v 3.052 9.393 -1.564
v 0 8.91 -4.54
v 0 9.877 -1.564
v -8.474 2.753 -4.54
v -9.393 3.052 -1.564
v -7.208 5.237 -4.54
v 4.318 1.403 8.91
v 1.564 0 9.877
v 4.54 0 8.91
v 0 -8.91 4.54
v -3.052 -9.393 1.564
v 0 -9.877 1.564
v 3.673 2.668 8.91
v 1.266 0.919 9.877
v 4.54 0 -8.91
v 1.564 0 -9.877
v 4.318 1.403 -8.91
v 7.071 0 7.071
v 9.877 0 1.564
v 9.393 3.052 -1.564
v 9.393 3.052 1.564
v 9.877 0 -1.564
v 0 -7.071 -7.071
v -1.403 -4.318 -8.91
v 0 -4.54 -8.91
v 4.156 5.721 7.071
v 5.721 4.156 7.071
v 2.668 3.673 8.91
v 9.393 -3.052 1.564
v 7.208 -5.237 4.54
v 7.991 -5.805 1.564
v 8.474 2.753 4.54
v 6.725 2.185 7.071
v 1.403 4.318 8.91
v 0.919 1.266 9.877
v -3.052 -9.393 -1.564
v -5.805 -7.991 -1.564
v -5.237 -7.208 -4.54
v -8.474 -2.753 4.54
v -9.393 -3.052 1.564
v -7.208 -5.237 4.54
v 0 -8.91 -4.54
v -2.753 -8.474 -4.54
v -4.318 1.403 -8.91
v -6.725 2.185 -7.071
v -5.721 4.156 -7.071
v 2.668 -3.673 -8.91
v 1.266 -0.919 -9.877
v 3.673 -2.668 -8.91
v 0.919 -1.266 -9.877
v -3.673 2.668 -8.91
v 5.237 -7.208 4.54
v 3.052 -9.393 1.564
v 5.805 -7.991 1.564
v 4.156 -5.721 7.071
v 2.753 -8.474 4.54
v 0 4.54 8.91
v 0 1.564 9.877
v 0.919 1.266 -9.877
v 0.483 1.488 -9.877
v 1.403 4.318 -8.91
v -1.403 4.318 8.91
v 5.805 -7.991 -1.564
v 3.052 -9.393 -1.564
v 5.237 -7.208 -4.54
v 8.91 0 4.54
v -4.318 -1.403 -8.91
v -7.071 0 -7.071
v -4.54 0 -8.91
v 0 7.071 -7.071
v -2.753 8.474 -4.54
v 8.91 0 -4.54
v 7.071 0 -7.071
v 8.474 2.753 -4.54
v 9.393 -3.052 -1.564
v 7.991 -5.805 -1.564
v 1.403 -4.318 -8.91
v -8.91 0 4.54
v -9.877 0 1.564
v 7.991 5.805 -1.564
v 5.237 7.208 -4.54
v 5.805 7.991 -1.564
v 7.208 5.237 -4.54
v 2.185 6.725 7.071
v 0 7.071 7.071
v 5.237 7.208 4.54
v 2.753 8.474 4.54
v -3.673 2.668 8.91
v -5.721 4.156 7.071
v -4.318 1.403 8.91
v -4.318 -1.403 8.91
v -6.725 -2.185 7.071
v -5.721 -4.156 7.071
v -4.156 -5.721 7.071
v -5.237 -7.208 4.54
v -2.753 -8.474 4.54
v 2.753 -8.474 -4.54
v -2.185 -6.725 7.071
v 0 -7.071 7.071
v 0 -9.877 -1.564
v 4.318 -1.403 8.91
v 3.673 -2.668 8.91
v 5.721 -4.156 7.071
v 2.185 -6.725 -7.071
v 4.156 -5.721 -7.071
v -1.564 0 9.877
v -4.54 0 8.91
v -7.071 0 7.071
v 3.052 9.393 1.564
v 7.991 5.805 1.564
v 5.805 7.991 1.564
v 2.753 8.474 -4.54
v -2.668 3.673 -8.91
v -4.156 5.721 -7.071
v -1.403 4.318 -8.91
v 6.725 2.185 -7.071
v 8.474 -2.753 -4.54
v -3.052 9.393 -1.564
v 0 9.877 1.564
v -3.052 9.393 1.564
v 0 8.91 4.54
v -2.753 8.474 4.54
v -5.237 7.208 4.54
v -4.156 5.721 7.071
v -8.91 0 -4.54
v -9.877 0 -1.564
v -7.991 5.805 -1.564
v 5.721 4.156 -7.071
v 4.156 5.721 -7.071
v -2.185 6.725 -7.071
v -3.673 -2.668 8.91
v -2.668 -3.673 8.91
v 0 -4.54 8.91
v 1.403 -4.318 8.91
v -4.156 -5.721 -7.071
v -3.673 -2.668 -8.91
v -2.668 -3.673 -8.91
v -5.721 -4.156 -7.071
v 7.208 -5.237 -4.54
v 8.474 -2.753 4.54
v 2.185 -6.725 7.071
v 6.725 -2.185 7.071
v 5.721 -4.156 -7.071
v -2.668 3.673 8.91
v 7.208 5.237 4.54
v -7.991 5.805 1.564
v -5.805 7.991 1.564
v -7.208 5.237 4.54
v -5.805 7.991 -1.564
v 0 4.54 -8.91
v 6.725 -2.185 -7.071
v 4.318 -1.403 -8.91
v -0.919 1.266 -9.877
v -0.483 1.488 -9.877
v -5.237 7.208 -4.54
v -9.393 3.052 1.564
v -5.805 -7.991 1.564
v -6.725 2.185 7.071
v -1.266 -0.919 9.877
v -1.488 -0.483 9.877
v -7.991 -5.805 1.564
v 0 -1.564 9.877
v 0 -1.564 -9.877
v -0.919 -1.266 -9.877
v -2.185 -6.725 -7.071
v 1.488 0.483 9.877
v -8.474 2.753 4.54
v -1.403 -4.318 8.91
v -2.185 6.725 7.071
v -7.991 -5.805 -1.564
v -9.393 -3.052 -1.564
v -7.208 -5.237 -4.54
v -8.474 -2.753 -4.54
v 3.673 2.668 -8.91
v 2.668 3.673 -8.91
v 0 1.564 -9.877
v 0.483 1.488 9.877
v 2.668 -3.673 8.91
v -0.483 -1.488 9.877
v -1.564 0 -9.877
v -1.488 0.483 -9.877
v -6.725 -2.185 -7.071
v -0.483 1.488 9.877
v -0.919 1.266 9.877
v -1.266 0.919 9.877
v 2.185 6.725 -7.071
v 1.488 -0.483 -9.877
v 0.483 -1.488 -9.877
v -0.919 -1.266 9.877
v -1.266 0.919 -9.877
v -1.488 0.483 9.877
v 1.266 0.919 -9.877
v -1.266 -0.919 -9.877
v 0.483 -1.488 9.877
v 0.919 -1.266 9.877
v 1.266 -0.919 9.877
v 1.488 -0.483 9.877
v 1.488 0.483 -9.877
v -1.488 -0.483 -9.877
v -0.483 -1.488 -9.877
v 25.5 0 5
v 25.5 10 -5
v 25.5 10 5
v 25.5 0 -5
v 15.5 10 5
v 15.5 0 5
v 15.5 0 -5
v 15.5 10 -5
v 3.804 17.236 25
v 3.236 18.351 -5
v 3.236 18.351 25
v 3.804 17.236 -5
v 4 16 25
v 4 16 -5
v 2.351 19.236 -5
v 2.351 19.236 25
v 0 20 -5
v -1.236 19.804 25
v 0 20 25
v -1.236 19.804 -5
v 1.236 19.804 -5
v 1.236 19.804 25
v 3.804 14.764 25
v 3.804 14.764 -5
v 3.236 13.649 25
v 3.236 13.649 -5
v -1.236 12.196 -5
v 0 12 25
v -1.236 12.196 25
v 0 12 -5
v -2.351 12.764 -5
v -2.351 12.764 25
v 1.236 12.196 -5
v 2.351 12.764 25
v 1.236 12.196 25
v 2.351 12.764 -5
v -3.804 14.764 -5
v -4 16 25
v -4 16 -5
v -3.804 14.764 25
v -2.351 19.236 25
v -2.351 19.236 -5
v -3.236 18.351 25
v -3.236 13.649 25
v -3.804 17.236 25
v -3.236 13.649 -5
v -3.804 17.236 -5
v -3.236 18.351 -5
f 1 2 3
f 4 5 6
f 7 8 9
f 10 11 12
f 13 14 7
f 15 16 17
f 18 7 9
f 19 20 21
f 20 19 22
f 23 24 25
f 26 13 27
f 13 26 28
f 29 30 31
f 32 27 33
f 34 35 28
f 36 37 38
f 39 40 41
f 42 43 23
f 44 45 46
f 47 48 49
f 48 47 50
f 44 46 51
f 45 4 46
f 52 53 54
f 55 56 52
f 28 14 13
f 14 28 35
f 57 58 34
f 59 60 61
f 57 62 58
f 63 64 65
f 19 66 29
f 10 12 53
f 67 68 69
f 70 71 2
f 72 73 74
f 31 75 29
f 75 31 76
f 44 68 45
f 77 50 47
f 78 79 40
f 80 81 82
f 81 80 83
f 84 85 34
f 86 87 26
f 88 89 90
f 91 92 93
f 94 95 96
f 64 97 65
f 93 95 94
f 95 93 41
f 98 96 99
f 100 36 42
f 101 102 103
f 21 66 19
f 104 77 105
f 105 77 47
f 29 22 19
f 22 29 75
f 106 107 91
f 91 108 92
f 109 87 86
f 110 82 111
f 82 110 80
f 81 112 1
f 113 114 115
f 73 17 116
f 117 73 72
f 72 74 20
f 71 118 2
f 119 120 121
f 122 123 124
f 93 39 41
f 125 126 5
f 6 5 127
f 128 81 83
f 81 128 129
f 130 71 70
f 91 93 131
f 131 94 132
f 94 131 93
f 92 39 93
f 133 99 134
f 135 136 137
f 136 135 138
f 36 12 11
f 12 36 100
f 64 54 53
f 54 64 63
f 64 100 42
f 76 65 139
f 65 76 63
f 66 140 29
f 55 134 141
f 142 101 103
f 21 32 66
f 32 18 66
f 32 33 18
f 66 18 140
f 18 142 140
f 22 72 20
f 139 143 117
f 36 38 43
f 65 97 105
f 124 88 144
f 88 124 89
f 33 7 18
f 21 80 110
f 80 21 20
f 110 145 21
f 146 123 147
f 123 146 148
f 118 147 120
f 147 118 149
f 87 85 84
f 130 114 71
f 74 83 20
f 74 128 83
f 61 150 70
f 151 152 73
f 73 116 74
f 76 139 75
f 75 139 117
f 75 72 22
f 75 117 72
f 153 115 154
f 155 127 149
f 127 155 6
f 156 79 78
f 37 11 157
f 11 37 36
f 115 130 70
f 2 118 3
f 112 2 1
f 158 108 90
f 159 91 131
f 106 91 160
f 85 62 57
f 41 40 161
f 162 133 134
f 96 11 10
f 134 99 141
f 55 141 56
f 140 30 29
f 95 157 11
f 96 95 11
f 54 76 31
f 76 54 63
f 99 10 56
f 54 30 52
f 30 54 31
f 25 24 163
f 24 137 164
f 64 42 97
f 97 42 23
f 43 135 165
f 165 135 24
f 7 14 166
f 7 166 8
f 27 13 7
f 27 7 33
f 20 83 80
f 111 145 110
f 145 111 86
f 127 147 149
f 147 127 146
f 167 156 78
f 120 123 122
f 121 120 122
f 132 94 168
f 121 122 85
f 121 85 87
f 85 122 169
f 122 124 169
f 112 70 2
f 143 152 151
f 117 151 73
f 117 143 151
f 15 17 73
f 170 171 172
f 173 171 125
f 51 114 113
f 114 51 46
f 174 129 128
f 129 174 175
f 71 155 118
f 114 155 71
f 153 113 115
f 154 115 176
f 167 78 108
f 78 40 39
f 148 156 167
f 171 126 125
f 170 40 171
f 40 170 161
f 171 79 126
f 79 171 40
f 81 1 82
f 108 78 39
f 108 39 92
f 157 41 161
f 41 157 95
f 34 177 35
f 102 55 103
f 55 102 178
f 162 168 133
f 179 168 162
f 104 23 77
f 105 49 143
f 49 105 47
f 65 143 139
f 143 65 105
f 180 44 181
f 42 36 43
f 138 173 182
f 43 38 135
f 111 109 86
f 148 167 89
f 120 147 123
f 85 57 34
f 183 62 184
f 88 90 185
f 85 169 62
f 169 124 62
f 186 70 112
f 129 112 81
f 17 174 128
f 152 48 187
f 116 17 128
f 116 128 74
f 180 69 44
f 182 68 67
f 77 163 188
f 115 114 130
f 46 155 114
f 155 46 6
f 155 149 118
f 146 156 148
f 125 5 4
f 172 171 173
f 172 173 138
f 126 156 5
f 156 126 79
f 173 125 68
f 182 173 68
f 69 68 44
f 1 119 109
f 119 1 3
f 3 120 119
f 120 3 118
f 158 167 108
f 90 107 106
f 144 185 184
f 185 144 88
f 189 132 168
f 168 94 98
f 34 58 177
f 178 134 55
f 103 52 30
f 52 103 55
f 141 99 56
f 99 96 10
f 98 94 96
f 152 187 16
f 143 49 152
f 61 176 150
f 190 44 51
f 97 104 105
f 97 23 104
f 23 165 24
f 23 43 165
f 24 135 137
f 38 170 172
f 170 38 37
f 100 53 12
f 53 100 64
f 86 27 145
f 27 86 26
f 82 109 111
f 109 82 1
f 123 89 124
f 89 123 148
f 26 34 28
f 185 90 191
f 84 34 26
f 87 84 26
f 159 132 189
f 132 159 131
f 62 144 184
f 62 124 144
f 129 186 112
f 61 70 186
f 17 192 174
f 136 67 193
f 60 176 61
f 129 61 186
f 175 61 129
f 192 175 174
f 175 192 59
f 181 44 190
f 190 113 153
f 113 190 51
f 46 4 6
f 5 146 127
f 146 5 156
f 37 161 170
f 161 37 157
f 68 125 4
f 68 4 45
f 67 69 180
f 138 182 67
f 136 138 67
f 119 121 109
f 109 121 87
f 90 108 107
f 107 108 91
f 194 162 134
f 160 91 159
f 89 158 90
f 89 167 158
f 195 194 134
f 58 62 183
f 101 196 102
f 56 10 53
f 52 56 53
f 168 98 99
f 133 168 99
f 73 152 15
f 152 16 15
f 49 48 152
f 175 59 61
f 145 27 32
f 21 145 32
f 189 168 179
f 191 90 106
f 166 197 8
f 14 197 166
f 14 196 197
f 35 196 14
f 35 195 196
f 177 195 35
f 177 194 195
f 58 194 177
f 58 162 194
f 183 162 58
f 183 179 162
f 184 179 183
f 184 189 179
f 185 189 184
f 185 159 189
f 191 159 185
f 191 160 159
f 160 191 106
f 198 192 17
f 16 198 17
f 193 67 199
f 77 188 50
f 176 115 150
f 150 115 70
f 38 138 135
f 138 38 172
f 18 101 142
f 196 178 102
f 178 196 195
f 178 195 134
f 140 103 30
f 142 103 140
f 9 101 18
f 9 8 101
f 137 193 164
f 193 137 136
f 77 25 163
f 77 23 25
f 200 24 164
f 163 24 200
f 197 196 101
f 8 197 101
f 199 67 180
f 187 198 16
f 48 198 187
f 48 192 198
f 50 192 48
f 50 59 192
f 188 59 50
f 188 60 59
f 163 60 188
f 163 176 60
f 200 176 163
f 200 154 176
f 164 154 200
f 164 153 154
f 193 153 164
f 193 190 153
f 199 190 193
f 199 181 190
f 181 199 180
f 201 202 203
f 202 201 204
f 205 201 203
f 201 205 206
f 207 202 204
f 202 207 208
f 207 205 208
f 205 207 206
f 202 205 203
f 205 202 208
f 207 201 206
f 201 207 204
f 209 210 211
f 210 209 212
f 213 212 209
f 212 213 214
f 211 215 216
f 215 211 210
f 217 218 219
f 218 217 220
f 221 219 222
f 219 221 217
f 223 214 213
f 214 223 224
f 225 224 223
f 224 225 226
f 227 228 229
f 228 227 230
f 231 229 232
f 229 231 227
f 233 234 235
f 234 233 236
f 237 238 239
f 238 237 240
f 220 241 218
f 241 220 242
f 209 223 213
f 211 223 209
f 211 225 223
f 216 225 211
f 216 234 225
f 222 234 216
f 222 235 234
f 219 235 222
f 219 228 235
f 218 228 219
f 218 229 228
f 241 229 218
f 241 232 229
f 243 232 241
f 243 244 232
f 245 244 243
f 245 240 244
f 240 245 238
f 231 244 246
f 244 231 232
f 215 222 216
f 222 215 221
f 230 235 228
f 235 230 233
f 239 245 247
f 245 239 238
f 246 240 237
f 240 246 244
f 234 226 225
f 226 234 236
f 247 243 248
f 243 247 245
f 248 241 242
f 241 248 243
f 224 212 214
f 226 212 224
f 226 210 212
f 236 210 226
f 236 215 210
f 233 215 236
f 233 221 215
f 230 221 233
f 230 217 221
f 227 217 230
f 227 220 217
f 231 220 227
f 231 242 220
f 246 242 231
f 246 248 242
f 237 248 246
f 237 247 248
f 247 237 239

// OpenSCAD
//Instructions: 
//1. a. Rotate (one finger) 
//   b. Zoom (two fingers) 
//   c. Preview (>>) 
//   d. Render (cube button) 
//   e. Save (File menu)
//   f. Export as STL (File menu)
//2. Change $fn to different numbers and preview. This controls the resolution of your shapes - very important for a high quality print. 
//3. Modify this code to make a sphere of radius 5.
//4. Move the cube close to the sphere so that they overlap.
//5. Make the cube have a height of 2.
//6. Change one radius of the cylinder to be 0. 
//7. Move the cylinder to the middle of the sphere.

$fn = 20;


sphere(r=10);

translate([15.5,0,-5]) 
cube([10,10,10]);

translate([0,16,-5]) 
cylinder(h=30,r1=4,r2=4);
